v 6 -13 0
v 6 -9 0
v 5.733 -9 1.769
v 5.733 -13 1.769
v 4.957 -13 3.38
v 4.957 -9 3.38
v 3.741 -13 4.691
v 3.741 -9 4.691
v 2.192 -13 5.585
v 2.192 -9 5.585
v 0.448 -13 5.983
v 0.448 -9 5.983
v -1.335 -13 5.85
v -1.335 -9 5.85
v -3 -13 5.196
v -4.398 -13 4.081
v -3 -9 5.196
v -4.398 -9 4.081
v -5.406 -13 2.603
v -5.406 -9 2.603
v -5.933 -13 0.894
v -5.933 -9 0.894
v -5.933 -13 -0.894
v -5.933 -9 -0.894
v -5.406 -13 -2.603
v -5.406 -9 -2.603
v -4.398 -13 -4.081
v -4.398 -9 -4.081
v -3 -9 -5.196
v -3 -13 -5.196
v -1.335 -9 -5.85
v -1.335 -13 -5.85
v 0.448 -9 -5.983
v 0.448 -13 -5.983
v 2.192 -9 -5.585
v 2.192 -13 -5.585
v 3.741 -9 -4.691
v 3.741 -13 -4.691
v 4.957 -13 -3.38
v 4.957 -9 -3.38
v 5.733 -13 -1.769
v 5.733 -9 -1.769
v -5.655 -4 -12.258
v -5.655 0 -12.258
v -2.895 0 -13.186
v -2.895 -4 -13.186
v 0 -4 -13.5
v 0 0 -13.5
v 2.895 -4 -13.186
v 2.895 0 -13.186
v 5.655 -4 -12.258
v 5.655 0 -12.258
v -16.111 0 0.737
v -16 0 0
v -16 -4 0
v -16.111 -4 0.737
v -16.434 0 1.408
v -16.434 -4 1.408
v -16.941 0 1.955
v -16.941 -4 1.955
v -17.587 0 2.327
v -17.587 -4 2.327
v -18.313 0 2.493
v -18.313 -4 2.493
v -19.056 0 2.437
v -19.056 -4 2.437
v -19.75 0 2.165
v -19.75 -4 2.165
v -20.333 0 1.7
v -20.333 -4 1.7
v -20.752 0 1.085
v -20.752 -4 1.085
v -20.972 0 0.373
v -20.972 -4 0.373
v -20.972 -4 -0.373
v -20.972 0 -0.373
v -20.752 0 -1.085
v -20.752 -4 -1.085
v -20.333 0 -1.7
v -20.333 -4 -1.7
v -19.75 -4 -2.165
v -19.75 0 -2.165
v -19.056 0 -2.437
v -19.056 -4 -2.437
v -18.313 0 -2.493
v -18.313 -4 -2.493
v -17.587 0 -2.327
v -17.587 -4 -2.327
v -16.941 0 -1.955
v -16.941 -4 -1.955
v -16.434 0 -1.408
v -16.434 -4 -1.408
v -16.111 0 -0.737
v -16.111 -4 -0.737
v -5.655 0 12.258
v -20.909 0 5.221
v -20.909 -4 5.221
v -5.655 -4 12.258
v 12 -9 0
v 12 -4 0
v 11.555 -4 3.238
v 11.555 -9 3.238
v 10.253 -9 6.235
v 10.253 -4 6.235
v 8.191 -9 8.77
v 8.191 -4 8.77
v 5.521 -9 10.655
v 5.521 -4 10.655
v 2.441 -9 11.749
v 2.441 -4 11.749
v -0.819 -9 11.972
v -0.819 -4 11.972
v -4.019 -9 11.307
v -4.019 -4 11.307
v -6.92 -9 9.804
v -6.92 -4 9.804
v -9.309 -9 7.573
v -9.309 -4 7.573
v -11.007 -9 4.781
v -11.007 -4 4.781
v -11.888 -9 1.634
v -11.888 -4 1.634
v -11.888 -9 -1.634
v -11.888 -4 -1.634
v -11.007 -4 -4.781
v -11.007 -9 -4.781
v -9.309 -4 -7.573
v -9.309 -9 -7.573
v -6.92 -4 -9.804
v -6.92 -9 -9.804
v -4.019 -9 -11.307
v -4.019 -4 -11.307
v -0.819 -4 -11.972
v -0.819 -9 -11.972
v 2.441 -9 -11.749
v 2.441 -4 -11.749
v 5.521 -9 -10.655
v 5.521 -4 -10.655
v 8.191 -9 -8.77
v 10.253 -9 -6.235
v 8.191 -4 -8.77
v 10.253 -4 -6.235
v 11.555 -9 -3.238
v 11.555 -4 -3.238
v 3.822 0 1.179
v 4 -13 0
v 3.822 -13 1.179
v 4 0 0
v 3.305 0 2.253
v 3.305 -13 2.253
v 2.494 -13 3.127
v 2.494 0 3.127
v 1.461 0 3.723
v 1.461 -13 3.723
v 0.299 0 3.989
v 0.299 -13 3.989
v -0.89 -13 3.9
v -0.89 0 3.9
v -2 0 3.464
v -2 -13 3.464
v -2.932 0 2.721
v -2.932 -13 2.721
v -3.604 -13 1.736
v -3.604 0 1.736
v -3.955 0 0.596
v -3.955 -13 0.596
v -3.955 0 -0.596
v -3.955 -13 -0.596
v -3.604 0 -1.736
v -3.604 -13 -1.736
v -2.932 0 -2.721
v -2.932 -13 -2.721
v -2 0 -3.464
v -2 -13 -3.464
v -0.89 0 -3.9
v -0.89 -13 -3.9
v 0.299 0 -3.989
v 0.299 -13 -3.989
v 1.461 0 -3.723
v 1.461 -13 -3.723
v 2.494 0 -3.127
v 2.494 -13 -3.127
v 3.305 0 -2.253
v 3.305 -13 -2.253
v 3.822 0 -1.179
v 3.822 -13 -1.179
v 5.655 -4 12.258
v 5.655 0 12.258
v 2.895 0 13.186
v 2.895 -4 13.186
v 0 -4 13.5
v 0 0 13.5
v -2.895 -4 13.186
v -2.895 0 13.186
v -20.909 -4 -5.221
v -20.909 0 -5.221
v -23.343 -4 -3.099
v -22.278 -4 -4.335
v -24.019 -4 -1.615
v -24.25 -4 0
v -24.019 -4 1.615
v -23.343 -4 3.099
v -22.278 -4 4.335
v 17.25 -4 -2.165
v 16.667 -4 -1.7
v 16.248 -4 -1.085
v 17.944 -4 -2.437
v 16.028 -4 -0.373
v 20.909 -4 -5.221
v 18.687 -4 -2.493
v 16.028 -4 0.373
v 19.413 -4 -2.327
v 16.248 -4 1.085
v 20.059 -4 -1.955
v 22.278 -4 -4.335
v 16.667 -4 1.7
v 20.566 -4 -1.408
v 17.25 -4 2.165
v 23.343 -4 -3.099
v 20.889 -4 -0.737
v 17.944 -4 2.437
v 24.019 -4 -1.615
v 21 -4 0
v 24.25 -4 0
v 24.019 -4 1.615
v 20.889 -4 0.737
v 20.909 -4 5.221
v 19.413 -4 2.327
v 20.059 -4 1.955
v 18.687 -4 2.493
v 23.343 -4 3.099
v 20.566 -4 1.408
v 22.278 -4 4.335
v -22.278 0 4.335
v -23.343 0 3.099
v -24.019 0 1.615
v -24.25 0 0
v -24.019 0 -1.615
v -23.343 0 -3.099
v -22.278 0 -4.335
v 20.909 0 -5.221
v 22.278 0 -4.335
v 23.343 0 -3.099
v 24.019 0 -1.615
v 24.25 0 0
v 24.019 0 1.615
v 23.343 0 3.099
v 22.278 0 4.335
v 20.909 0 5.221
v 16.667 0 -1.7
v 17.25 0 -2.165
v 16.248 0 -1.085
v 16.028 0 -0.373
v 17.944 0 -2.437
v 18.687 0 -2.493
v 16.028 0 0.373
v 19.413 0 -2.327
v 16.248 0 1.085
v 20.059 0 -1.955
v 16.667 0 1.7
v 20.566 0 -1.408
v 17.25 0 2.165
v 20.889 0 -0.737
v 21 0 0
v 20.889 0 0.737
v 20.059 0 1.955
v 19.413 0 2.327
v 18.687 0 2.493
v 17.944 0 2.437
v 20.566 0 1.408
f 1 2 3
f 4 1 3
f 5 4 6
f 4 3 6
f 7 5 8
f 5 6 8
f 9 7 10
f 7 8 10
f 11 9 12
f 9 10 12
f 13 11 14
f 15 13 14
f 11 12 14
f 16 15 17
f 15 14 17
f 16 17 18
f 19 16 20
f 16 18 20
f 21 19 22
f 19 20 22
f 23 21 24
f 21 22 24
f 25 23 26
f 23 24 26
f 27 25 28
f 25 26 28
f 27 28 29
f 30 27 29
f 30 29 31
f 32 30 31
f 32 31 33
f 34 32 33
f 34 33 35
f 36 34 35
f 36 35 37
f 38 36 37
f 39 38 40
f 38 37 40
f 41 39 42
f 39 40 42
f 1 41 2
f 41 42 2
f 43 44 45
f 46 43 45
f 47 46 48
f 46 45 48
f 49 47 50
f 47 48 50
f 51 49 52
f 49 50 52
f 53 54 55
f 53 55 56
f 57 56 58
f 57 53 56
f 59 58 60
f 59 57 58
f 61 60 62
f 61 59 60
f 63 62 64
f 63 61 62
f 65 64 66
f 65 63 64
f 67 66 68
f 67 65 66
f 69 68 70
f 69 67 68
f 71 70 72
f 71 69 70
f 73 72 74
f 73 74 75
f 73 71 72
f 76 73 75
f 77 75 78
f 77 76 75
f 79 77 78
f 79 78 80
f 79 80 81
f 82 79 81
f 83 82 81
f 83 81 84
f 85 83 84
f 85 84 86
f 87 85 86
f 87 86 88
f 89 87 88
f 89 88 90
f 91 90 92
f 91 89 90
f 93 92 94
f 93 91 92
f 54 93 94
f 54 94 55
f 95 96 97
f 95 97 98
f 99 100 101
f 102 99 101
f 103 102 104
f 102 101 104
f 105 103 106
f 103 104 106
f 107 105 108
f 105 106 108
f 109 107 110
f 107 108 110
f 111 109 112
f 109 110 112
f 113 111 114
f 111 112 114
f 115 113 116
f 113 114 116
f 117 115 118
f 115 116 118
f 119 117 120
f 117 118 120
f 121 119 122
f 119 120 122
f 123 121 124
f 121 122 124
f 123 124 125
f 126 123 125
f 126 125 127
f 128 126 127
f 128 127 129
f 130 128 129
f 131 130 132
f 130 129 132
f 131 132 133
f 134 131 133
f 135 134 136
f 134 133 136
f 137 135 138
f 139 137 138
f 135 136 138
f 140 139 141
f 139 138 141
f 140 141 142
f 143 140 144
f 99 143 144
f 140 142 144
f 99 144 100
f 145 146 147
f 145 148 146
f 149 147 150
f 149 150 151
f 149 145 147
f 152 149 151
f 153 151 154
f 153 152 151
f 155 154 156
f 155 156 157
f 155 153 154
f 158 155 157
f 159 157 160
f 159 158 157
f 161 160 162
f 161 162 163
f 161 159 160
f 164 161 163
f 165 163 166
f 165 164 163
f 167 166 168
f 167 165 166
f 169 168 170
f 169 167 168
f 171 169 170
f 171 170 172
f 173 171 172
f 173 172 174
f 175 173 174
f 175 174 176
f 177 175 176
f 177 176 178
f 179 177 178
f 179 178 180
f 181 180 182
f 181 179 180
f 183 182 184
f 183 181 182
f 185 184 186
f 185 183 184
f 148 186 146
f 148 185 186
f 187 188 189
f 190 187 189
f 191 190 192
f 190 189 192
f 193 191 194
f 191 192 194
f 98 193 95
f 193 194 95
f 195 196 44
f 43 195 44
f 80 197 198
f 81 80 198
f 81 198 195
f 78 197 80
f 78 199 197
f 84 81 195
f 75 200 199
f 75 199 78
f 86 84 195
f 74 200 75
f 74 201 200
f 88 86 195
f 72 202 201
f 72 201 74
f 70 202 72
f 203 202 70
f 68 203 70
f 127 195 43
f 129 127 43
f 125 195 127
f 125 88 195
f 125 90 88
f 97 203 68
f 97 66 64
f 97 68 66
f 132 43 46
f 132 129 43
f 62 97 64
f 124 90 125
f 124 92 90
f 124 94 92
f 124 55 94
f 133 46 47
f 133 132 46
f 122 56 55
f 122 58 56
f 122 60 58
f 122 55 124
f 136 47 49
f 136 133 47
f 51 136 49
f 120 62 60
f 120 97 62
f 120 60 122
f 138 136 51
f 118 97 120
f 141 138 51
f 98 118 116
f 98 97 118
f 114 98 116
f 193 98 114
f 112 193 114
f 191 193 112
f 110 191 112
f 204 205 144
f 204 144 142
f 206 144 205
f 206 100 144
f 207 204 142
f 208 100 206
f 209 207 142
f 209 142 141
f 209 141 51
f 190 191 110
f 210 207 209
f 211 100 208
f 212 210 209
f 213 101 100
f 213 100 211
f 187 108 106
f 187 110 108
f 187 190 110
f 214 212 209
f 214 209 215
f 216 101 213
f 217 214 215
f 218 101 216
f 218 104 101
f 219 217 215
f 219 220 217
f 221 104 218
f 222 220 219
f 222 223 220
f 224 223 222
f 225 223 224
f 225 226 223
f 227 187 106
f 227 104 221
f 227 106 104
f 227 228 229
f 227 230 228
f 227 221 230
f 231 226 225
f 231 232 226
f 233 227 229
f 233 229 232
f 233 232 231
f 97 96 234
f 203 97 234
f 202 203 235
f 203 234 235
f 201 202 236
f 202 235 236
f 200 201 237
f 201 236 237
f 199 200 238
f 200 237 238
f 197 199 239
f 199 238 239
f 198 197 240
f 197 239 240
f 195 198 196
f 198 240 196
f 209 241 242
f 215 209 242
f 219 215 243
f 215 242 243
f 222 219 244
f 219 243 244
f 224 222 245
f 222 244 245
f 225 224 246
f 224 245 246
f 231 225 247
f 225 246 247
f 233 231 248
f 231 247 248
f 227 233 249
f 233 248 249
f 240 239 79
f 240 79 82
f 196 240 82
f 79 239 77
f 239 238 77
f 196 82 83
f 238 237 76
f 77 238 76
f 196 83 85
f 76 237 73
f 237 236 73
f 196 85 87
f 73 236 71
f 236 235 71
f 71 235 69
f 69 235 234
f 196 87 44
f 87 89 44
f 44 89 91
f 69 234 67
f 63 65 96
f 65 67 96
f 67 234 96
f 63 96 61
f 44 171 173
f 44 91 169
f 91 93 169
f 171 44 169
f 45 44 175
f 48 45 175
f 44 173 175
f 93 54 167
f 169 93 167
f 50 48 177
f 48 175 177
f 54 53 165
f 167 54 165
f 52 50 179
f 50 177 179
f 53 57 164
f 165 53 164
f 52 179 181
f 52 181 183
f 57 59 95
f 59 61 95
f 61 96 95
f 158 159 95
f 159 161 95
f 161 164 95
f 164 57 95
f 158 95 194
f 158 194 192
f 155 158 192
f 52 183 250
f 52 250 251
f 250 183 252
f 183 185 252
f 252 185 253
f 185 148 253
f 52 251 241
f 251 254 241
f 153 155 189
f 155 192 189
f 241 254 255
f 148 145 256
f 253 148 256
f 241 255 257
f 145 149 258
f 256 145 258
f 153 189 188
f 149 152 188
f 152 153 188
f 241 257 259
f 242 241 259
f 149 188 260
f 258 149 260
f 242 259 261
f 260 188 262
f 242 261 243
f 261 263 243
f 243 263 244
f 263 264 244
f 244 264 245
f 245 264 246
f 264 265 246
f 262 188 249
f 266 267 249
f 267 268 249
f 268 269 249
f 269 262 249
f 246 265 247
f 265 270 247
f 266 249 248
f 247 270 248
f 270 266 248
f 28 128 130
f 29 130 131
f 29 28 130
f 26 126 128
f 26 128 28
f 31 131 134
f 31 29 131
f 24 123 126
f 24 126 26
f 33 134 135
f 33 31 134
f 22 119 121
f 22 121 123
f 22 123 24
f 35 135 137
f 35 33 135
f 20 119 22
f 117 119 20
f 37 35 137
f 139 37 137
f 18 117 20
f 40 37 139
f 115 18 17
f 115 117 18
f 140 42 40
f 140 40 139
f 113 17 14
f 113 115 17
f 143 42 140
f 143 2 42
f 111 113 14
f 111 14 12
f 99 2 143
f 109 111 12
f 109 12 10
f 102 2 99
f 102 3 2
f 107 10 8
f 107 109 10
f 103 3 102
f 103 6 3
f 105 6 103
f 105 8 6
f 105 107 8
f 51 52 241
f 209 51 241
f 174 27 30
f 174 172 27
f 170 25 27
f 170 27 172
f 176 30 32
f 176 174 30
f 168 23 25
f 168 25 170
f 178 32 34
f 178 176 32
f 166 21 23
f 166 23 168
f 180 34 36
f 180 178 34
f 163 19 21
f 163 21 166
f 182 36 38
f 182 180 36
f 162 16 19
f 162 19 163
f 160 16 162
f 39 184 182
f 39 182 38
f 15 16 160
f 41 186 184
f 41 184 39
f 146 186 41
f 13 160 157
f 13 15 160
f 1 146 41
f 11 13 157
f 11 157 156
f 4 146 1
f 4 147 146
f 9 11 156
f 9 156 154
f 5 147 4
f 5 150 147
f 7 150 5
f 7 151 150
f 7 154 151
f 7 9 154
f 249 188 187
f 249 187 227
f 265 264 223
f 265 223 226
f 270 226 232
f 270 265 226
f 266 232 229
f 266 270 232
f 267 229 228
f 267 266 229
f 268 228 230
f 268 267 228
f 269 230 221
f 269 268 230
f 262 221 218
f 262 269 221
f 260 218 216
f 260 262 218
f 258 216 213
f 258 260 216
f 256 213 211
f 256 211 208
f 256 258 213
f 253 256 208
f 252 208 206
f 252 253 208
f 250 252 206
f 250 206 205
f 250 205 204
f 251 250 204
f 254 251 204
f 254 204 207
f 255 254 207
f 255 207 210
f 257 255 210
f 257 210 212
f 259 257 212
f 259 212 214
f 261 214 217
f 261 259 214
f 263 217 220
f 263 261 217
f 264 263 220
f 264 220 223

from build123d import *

# Parameters (mm, degrees)
SKETCH_R      = 4
SKETCH_R_2    = 2.5
PAD_DEPTH     = 4
SKETCH001_R   = 12
SKETCH001_R_2 = 4
PAD001_DEPTH  = 5
SKETCH002_R   = 6
SKETCH002_R_2 = 4
PAD002_DEPTH  = 4


with BuildPart() as part:
    # Sketch → Pad (new body)
    with BuildSketch(Plane.XZ):
        with BuildLine():
            ThreePointArc((5.655405, 12.258319), (0, 13.5), (-5.655405, 12.258319))
            Line((-20.908784, 5.221136), (-5.655405, 12.258319))
            ThreePointArc((-20.908784, 5.221136), (-24.25, 0), (-20.908784, -5.221136))
            Line((-20.908784, -5.221136), (-5.655405, -12.258319))
            ThreePointArc((-5.655405, -12.258319), (0, -13.5), (5.655405, -12.258319))
            Line((5.655405, -12.258319), (20.908784, -5.221136))
            ThreePointArc((20.908784, -5.221136), (24.25, 0), (20.908784, 5.221136))
            Line((5.655405, 12.258319), (20.908784, 5.221136))
        make_face()
        Circle(SKETCH_R, mode=Mode.SUBTRACT)
        with Locations((18.5, 0)):
            Circle(SKETCH_R_2, mode=Mode.SUBTRACT)
        with Locations((-18.5, 0)):
            Circle(SKETCH_R_2, mode=Mode.SUBTRACT)
    extrude(amount=PAD_DEPTH)

    # Sketch001 (on Face13 of Pad) → Pad001 (join)
    with BuildSketch(Plane.XZ.offset(4)):
        Circle(SKETCH001_R)
        Circle(SKETCH001_R_2, mode=Mode.SUBTRACT)
    extrude(amount=PAD001_DEPTH)

    # Sketch002 (on Face16 of Pad001) → Pad002 (join)
    with BuildSketch(Plane.XZ.offset(9)):
        Circle(SKETCH002_R)
        Circle(SKETCH002_R_2, mode=Mode.SUBTRACT)
    extrude(amount=PAD002_DEPTH)


solid = part.part
